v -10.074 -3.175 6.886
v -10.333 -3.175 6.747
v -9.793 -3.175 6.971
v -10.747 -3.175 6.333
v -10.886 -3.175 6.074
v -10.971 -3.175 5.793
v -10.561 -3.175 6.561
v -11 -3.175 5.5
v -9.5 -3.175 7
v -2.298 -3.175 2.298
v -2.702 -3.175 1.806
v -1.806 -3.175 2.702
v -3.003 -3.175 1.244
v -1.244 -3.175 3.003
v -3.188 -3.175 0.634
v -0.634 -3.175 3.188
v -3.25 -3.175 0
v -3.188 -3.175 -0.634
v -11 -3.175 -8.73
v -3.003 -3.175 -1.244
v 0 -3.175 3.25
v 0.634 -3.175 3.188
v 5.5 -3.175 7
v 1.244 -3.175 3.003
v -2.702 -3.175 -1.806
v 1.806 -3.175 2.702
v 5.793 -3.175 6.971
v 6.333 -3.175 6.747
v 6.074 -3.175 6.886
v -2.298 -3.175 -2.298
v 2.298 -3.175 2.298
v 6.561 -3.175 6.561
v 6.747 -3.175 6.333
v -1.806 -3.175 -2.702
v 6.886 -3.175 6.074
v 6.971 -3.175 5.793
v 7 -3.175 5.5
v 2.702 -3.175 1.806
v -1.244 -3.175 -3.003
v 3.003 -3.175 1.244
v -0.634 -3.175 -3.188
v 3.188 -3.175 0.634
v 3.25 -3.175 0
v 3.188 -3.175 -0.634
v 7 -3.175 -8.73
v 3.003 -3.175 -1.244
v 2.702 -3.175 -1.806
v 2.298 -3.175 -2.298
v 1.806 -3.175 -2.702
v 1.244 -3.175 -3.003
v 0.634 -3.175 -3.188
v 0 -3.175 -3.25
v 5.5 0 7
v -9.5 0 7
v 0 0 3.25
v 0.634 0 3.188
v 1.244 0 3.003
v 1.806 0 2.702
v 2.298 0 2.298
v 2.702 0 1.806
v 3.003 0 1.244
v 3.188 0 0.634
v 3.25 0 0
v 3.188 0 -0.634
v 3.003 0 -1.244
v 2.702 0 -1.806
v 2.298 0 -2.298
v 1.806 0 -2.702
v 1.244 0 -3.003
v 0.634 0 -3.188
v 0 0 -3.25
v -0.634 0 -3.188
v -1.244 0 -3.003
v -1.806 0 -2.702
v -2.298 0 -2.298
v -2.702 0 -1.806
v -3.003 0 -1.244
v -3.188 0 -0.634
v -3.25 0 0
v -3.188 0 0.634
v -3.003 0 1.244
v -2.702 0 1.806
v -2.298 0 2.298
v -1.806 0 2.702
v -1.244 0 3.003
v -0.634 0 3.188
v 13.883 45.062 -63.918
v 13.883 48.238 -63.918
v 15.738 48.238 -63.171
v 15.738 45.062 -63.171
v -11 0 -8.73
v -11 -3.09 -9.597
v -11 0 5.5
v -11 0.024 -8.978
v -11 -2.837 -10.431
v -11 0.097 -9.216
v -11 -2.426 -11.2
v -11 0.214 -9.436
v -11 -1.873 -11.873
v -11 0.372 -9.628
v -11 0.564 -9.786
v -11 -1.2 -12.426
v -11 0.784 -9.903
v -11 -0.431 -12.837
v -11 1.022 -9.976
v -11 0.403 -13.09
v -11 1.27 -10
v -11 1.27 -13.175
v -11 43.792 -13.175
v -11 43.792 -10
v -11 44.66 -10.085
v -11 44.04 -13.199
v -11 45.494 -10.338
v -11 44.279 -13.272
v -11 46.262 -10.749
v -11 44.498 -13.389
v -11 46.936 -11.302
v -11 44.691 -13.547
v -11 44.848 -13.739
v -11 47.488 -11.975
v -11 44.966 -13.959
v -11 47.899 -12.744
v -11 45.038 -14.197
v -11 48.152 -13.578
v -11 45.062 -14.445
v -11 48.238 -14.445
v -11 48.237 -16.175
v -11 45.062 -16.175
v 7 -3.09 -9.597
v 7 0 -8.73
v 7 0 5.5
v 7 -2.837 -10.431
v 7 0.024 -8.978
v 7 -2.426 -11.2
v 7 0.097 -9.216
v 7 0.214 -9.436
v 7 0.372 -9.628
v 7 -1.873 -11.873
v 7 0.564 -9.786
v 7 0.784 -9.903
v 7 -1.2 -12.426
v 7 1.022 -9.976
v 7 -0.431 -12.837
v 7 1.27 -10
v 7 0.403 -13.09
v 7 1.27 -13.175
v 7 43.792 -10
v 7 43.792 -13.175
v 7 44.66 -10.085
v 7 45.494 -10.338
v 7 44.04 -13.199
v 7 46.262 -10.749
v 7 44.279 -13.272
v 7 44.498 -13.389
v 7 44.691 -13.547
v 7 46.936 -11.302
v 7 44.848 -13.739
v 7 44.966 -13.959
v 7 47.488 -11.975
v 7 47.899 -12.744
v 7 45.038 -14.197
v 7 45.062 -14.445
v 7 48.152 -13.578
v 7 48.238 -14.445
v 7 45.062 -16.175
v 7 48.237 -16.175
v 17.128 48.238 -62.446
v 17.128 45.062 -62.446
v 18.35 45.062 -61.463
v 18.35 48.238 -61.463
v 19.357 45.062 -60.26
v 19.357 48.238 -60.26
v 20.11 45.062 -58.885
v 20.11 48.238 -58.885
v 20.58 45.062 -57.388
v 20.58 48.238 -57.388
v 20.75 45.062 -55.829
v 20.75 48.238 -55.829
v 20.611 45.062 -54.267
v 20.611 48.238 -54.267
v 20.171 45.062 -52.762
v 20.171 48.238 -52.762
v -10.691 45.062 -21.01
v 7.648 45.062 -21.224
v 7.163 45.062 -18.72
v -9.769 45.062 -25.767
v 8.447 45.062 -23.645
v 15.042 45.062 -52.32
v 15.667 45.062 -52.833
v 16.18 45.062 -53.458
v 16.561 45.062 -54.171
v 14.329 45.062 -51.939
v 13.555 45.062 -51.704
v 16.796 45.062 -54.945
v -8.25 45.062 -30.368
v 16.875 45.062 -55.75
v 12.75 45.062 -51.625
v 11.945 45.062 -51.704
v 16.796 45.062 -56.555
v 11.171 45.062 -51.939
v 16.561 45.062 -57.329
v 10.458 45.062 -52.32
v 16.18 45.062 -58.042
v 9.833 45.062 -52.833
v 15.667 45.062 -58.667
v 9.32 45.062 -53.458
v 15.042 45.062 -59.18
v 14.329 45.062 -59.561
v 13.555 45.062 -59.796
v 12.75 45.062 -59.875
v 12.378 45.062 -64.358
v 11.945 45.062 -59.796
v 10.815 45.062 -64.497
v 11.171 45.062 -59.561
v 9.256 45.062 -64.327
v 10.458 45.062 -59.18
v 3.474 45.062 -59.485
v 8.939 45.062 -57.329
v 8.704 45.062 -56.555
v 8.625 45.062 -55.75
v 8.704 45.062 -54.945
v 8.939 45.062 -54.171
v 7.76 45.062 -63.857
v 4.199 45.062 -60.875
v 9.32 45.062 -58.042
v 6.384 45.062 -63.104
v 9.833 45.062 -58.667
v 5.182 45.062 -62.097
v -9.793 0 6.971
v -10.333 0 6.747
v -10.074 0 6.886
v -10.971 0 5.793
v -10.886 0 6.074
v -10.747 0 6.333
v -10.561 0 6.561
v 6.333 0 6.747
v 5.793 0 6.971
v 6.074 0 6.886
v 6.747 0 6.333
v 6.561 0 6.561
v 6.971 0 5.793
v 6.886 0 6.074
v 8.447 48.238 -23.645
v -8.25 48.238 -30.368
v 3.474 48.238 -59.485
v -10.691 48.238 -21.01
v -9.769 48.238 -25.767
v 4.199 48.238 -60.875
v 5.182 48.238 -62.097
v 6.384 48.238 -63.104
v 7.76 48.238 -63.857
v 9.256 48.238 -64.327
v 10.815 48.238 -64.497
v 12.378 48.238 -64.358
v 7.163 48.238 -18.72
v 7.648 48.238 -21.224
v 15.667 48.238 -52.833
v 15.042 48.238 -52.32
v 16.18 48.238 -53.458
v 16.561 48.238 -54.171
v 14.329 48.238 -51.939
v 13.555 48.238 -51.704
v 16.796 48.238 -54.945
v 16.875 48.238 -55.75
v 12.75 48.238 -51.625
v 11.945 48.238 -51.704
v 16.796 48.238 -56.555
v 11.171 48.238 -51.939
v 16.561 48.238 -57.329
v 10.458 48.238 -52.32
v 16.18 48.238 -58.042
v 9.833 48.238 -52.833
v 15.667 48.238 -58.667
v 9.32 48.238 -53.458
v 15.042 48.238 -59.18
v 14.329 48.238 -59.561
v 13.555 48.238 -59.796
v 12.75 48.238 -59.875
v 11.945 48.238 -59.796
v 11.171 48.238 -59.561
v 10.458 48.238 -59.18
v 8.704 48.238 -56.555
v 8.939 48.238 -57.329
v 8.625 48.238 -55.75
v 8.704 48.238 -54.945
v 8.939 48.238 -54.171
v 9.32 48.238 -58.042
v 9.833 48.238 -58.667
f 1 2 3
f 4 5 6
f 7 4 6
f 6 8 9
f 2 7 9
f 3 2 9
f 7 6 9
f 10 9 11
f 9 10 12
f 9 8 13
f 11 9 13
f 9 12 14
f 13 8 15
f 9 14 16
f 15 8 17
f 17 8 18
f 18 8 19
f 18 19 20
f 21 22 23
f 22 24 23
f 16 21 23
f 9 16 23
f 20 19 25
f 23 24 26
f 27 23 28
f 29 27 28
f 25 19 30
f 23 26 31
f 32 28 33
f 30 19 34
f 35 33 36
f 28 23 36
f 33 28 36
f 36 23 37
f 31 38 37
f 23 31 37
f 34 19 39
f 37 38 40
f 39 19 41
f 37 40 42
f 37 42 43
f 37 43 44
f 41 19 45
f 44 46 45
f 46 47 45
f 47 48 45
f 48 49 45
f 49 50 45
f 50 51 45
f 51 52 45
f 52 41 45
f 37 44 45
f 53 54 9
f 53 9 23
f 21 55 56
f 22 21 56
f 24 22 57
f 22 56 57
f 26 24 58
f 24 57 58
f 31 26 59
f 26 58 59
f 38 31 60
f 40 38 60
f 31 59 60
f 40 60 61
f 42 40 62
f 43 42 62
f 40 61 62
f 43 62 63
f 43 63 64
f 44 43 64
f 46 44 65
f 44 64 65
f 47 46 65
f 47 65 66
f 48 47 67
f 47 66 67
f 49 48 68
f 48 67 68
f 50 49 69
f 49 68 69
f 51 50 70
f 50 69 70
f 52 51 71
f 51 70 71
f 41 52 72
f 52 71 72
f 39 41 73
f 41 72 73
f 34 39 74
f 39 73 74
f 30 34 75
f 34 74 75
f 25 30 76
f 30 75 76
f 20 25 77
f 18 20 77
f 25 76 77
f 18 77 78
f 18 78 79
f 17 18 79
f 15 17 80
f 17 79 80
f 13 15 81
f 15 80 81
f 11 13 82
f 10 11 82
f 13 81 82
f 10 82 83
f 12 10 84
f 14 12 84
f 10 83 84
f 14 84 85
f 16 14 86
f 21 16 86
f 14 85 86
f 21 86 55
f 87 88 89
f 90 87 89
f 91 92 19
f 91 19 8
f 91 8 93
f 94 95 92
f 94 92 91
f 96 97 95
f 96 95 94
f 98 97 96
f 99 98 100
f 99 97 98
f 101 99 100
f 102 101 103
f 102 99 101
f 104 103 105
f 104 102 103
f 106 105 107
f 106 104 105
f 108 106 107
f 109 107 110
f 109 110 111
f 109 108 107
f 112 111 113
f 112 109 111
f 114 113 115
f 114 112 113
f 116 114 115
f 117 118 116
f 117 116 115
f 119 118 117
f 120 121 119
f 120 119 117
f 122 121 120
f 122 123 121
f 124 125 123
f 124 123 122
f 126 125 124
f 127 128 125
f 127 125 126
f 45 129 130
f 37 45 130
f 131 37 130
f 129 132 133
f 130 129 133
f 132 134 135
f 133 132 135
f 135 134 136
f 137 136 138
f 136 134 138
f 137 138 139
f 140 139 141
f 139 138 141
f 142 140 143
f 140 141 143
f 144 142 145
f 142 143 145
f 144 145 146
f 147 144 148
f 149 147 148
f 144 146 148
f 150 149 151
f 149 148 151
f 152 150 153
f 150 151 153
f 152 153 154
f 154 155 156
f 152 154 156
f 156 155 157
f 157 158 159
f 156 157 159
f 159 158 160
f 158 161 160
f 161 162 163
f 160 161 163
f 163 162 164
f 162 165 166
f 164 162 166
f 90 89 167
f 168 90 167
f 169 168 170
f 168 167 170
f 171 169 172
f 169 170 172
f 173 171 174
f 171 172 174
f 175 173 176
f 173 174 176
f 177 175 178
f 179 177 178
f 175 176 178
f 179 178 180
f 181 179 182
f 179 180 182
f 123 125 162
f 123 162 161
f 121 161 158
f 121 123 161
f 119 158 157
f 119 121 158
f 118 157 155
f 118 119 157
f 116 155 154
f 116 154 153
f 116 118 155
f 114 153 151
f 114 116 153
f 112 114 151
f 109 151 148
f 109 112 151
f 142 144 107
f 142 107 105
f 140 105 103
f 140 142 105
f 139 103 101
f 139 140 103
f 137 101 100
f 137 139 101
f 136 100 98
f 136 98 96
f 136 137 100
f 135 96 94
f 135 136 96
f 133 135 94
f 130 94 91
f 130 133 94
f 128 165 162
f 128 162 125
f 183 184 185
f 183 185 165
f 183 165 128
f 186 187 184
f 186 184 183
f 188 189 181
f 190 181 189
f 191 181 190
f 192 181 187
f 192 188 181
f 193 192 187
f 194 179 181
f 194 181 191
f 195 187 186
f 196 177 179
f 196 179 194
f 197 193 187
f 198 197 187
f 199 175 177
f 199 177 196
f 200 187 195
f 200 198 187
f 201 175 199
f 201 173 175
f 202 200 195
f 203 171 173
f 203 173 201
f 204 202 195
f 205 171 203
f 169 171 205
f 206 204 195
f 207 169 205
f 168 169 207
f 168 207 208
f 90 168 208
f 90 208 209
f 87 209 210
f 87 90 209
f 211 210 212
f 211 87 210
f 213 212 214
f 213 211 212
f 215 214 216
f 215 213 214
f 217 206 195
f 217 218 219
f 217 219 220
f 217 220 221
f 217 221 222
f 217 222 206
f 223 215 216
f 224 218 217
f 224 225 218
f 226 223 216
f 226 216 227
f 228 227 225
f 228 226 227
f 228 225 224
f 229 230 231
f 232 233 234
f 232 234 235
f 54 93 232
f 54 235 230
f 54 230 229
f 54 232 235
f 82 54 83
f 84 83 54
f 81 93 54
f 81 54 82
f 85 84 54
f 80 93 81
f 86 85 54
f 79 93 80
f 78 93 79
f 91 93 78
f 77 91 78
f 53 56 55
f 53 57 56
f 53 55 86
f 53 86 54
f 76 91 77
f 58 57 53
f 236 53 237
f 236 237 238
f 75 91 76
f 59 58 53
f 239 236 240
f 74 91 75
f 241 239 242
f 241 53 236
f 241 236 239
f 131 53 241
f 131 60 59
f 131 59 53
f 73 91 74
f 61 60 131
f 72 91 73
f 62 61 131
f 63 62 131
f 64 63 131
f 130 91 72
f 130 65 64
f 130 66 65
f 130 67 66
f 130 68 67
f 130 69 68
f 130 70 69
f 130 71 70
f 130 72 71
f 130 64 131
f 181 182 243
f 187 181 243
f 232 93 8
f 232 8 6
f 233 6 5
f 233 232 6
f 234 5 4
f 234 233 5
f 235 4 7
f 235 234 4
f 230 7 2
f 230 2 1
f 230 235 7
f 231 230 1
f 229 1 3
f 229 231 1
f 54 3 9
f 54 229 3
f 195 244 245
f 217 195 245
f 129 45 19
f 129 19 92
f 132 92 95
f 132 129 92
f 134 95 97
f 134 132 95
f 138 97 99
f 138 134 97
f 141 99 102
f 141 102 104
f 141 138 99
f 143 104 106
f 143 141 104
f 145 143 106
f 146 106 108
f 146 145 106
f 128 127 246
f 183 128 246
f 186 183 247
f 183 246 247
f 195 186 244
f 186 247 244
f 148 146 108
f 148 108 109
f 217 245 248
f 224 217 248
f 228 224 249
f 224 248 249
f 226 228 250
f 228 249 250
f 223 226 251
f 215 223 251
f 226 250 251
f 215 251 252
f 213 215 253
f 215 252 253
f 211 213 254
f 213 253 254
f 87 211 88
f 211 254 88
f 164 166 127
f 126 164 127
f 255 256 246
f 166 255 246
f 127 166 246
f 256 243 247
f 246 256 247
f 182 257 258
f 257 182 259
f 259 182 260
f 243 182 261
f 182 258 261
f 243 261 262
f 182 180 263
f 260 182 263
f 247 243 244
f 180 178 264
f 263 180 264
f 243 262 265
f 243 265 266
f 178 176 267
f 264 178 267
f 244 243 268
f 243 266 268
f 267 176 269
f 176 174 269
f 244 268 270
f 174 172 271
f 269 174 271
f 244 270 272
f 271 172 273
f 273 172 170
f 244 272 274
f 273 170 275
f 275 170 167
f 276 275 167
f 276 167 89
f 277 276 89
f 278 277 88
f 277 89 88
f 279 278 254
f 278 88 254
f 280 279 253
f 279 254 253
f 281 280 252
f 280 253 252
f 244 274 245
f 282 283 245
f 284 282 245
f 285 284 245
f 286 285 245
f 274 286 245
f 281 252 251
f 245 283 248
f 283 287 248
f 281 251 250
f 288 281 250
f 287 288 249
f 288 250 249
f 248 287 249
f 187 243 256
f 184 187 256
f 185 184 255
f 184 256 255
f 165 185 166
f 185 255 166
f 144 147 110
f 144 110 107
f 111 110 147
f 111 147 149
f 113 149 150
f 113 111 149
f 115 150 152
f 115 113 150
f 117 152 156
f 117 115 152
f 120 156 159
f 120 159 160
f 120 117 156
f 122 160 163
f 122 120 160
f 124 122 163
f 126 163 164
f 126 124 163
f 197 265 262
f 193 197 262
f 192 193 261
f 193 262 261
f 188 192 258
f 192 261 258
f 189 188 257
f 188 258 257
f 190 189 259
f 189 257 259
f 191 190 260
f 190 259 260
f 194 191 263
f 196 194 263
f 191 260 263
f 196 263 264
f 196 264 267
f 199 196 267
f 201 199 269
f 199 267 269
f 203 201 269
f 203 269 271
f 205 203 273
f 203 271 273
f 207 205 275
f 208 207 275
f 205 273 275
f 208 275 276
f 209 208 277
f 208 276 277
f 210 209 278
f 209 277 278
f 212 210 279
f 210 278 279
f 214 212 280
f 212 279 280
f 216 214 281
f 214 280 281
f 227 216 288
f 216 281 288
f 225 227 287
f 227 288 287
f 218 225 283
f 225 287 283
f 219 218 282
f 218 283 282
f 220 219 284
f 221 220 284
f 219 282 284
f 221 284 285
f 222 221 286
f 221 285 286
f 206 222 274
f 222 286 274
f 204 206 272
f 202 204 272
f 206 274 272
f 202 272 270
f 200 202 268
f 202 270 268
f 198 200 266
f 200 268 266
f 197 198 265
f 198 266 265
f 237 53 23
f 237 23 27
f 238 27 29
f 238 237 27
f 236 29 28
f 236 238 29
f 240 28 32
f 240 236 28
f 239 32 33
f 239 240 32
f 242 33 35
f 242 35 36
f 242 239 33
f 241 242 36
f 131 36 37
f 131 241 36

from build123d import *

# Parameters (mm, degrees)
SKETCH1_R                    = 3.25
BASE_FLANGE1_DEPTH           = 3.175
EDGE_FLANGE1_STRIP_W         = 15.24
EDGE_FLANGE1_STRIP_H         = 3.175
EDGE_FLANGE1_STRIP_CUT_DEPTH = 18
EDGE_FLANGE1_DEPTH           = 18
EDGE_FLANGE2_STRIP_W         = 15.24
EDGE_FLANGE2_STRIP_H         = 3.175
EDGE_FLANGE2_STRIP_CUT_DEPTH = 18
EDGE_FLANGE2_DEPTH           = 18
SKETCH12_R                   = 4.125
BOSS_EXTRUDE1_DEPTH          = 3.175


# Sheet-metal steps are written as plain solids
with BuildPart() as part:
    # Sketch1 → Base-Flange1 (new body)
    with BuildSketch(Plane(origin=(0, 0, 0), x_dir=(1, 0, 0), z_dir=(0, 1, 0))):
        with BuildLine():
            Line((7, -5.5), (7, 10))
            Line((7, 10), (-11, 10))
            Line((-11, 10), (-11, -5.5))
            ThreePointArc((-11, -5.5), (-10.560660172, -6.560660172), (-9.5, -7))
            Line((-9.5, -7), (5.5, -7))
            ThreePointArc((5.5, -7), (6.560660172, -6.560660172), (7, -5.5))
        make_face()
        with Locations(Location((0, 0, 0), (0, 0, 270))):
            Circle(SKETCH1_R, mode=Mode.SUBTRACT)
    extrude(amount=-BASE_FLANGE1_DEPTH)

    # Edge-Flange1 strip (across the edge) → Edge-Flange1 strip cut (cut)
    with BuildSketch(Plane(origin=(7, 0, -10), x_dir=(0, 0, 1), z_dir=(-1, 0, 0))):
        with Locations((-6.35, -1.5875)):
            Rectangle(EDGE_FLANGE1_STRIP_W, EDGE_FLANGE1_STRIP_H)
    extrude(amount=EDGE_FLANGE1_STRIP_CUT_DEPTH, mode=Mode.SUBTRACT)

    # Edge-Flange1 section (across the edge) → Edge-Flange1 (add)
    with BuildSketch(Plane(origin=(7, 0, -10), x_dir=(0, 0, 1), z_dir=(-1, 0, 0))):
        with BuildLine():
            Line((-3.175, 1.27), (-3.175, 45.0625))
            Line((-3.175, 45.0625), (0, 45.0625))
            Line((0, 45.0625), (0, 1.27))
            ThreePointArc((0, 1.27), (0.371974388, 0.371974388), (1.27, 0))
            Line((1.27, 0), (1.27, -3.175))
            ThreePointArc((1.27, -3.175), (-1.873089642, -1.873089642), (-3.175, 1.27))
        make_face()
    extrude(amount=EDGE_FLANGE1_DEPTH)

    # Edge-Flange2 strip (across the edge) → Edge-Flange2 strip cut (cut)
    with BuildSketch(Plane(origin=(-11, 45.0625, -13.175), x_dir=(0, -1, 0), z_dir=(1, 0, 0))):
        with Locations((-6.35, -1.5875)):
            Rectangle(EDGE_FLANGE2_STRIP_W, EDGE_FLANGE2_STRIP_H)
    extrude(amount=EDGE_FLANGE2_STRIP_CUT_DEPTH, mode=Mode.SUBTRACT)

    # Edge-Flange2 section (across the edge) → Edge-Flange2 (add)
    with BuildSketch(Plane(origin=(-11, 45.0625, -13.175), x_dir=(0, -1, 0), z_dir=(1, 0, 0))):
        with BuildLine():
            Line((-3.175, 1.27), (-3.175, 3))
            Line((-3.175, 3), (0, 3))
            Line((0, 3), (0, 1.27))
            ThreePointArc((0, 1.27), (0.371974388, 0.371974388), (1.27, 0))
            Line((1.27, 0), (1.27, -3.175))
            ThreePointArc((1.27, -3.175), (-1.873089642, -1.873089642), (-3.175, 1.27))
        make_face()
    extrude(amount=EDGE_FLANGE2_DEPTH)

    # Sketch12 → Boss-Extrude1 (add)
    with BuildSketch(Plane(origin=(0, 48.2375, 0), x_dir=(1, 0, 0), z_dir=(0, 1, 0))):
        with BuildLine():
            Line((7, 16.175), (-11, 16.175))
            ThreePointArc((-11, 16.175), (-10.306151754, 23.403488178), (-8.249945193, 30.368004048))
            Line((-8.249945193, 30.368004048), (3.473693159, 59.484997741))
            ThreePointArc((3.473693159, 59.484997741), (7.760101436, 63.857301034), (13.882735104, 63.918037982))
            Line((13.882735104, 63.918037982), (15.737995377, 63.171037769))
            ThreePointArc((15.737995377, 63.171037769), (20.11029867, 58.884629492), (20.171035618, 52.761995824))
            Line((20.171035618, 52.761995824), (8.447397267, 23.64500213))
            ThreePointArc((8.447397267, 23.64500213), (7.365183288, 19.979467462), (7, 16.175))
        make_face()
        with Locations(Location((12.749994525, 55.749996676, 0), (0, 0, 270))):
            Circle(SKETCH12_R, mode=Mode.SUBTRACT)
    extrude(amount=-BOSS_EXTRUDE1_DEPTH)


solid = part.part
